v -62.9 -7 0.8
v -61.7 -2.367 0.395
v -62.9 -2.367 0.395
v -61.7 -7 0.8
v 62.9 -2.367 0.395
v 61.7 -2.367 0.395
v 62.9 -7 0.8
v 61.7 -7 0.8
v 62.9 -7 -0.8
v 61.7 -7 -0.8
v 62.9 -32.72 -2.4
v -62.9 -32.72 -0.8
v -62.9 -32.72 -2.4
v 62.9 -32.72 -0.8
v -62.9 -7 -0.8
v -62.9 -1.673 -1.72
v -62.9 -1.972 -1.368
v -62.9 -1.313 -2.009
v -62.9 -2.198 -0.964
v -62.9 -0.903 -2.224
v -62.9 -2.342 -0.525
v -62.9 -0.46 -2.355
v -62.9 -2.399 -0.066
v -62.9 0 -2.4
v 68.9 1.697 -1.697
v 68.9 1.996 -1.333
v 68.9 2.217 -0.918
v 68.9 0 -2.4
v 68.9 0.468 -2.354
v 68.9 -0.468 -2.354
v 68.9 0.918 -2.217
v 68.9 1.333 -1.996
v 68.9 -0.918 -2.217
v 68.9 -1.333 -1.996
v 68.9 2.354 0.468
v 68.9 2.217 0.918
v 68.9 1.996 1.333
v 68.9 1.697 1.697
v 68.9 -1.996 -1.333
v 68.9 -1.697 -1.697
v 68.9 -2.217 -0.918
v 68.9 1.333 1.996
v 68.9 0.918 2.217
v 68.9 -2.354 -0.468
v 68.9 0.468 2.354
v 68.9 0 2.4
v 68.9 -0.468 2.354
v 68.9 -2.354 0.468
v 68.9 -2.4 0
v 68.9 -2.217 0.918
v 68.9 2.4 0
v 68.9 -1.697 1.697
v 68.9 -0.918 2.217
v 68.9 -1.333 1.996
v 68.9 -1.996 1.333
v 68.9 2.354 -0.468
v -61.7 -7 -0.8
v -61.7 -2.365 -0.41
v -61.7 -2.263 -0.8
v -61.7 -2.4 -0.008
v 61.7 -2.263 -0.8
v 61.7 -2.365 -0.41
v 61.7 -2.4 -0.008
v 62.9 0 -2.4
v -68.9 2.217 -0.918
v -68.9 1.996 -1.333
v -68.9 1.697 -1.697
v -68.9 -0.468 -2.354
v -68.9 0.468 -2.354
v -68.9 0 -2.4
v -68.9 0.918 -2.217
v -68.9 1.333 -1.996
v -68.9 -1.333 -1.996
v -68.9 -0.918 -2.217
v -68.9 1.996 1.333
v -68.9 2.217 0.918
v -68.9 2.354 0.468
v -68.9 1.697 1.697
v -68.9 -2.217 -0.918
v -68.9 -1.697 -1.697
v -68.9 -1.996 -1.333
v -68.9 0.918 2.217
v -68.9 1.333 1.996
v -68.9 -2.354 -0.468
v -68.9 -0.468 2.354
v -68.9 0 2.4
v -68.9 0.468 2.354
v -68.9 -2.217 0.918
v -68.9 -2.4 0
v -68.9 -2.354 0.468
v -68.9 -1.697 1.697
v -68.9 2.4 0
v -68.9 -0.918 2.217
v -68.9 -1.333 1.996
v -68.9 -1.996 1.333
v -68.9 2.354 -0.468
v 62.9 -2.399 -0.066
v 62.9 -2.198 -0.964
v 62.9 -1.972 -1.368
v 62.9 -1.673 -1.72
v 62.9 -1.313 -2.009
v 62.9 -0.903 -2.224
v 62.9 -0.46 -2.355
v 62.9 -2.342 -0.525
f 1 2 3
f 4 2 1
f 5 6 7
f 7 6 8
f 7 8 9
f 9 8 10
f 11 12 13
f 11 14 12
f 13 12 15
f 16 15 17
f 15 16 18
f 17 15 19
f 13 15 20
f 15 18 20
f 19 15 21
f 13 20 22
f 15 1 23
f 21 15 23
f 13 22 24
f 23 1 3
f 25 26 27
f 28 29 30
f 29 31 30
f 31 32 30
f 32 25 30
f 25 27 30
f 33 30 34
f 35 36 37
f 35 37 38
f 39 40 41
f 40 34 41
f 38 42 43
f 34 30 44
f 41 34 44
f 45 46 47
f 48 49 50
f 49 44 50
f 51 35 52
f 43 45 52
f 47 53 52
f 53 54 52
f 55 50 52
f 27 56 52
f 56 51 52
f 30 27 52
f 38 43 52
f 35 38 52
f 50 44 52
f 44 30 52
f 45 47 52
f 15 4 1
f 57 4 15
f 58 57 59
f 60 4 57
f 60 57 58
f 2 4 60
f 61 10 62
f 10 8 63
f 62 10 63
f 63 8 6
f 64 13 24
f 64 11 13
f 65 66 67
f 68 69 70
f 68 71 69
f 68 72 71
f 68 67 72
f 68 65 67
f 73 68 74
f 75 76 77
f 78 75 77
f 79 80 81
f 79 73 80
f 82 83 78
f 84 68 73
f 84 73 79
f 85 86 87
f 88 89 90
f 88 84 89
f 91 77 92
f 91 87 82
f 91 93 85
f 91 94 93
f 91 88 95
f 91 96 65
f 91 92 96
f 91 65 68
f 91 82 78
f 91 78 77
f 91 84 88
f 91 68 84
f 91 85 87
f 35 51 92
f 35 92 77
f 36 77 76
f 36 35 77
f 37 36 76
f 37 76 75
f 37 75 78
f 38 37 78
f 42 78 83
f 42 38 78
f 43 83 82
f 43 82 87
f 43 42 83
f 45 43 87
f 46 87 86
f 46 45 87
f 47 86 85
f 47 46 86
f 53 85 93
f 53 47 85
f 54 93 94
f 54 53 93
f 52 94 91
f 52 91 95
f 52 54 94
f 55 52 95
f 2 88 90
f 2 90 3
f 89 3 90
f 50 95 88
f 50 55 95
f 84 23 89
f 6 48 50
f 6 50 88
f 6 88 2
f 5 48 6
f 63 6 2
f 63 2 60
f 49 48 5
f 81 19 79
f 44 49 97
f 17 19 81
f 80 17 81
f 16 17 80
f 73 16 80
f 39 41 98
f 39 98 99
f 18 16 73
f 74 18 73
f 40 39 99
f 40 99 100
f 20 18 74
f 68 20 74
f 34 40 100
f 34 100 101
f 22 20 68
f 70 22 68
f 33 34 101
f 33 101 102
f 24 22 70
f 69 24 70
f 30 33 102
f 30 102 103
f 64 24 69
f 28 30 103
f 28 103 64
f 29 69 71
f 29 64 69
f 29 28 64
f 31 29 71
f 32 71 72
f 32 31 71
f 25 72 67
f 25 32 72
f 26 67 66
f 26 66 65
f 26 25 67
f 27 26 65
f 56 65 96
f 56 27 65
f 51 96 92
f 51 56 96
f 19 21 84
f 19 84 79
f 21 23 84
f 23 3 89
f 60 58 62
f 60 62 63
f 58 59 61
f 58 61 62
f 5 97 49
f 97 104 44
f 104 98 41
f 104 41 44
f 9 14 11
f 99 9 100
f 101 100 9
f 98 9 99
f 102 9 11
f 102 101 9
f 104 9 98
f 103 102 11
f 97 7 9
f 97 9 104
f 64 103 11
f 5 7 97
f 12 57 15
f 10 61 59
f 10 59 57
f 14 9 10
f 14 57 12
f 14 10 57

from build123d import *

# Parameters (mm, degrees)
F0_W     = 137.8
F0_H     = 2.4
F3_DEPTH = 62.9
F4_START = -61.7
F4_DEPTH = 1.2


with BuildPart() as f1:
    # F0 (on Top) → F1 (revolve)
    with BuildSketch(Plane.XY):
        with Locations((0, 1.2)):
            Rectangle(F0_W, F0_H)
    revolve(axis=Axis((-37.6928597689, 0, 0), (1, 0, 0)))

    # F2 (on Right) → F3 (join, symmetric)
    with BuildSketch(Plane.YZ):
        Polygon((-32.72, -2.4), (0, -2.4), (0, -0.8), (-7, -0.8), (-32.72, -0.8), align=None)
    extrude(amount=F3_DEPTH, both=True)

    # F2 (on Right) → F4 (join)
    with BuildSketch(Plane.YZ.offset(F4_START)):
        Polygon((-7, -0.8), (0, -0.8), (0, 0.1875793553), (-7, 0.8), align=None)
    extrude(amount=-F4_DEPTH)

    # F5: F1 across plane


with BuildPart() as f1_1:
    add(f1.part)
    add(f1.part.mirror(Plane.YZ))


solid = f1_1.part
